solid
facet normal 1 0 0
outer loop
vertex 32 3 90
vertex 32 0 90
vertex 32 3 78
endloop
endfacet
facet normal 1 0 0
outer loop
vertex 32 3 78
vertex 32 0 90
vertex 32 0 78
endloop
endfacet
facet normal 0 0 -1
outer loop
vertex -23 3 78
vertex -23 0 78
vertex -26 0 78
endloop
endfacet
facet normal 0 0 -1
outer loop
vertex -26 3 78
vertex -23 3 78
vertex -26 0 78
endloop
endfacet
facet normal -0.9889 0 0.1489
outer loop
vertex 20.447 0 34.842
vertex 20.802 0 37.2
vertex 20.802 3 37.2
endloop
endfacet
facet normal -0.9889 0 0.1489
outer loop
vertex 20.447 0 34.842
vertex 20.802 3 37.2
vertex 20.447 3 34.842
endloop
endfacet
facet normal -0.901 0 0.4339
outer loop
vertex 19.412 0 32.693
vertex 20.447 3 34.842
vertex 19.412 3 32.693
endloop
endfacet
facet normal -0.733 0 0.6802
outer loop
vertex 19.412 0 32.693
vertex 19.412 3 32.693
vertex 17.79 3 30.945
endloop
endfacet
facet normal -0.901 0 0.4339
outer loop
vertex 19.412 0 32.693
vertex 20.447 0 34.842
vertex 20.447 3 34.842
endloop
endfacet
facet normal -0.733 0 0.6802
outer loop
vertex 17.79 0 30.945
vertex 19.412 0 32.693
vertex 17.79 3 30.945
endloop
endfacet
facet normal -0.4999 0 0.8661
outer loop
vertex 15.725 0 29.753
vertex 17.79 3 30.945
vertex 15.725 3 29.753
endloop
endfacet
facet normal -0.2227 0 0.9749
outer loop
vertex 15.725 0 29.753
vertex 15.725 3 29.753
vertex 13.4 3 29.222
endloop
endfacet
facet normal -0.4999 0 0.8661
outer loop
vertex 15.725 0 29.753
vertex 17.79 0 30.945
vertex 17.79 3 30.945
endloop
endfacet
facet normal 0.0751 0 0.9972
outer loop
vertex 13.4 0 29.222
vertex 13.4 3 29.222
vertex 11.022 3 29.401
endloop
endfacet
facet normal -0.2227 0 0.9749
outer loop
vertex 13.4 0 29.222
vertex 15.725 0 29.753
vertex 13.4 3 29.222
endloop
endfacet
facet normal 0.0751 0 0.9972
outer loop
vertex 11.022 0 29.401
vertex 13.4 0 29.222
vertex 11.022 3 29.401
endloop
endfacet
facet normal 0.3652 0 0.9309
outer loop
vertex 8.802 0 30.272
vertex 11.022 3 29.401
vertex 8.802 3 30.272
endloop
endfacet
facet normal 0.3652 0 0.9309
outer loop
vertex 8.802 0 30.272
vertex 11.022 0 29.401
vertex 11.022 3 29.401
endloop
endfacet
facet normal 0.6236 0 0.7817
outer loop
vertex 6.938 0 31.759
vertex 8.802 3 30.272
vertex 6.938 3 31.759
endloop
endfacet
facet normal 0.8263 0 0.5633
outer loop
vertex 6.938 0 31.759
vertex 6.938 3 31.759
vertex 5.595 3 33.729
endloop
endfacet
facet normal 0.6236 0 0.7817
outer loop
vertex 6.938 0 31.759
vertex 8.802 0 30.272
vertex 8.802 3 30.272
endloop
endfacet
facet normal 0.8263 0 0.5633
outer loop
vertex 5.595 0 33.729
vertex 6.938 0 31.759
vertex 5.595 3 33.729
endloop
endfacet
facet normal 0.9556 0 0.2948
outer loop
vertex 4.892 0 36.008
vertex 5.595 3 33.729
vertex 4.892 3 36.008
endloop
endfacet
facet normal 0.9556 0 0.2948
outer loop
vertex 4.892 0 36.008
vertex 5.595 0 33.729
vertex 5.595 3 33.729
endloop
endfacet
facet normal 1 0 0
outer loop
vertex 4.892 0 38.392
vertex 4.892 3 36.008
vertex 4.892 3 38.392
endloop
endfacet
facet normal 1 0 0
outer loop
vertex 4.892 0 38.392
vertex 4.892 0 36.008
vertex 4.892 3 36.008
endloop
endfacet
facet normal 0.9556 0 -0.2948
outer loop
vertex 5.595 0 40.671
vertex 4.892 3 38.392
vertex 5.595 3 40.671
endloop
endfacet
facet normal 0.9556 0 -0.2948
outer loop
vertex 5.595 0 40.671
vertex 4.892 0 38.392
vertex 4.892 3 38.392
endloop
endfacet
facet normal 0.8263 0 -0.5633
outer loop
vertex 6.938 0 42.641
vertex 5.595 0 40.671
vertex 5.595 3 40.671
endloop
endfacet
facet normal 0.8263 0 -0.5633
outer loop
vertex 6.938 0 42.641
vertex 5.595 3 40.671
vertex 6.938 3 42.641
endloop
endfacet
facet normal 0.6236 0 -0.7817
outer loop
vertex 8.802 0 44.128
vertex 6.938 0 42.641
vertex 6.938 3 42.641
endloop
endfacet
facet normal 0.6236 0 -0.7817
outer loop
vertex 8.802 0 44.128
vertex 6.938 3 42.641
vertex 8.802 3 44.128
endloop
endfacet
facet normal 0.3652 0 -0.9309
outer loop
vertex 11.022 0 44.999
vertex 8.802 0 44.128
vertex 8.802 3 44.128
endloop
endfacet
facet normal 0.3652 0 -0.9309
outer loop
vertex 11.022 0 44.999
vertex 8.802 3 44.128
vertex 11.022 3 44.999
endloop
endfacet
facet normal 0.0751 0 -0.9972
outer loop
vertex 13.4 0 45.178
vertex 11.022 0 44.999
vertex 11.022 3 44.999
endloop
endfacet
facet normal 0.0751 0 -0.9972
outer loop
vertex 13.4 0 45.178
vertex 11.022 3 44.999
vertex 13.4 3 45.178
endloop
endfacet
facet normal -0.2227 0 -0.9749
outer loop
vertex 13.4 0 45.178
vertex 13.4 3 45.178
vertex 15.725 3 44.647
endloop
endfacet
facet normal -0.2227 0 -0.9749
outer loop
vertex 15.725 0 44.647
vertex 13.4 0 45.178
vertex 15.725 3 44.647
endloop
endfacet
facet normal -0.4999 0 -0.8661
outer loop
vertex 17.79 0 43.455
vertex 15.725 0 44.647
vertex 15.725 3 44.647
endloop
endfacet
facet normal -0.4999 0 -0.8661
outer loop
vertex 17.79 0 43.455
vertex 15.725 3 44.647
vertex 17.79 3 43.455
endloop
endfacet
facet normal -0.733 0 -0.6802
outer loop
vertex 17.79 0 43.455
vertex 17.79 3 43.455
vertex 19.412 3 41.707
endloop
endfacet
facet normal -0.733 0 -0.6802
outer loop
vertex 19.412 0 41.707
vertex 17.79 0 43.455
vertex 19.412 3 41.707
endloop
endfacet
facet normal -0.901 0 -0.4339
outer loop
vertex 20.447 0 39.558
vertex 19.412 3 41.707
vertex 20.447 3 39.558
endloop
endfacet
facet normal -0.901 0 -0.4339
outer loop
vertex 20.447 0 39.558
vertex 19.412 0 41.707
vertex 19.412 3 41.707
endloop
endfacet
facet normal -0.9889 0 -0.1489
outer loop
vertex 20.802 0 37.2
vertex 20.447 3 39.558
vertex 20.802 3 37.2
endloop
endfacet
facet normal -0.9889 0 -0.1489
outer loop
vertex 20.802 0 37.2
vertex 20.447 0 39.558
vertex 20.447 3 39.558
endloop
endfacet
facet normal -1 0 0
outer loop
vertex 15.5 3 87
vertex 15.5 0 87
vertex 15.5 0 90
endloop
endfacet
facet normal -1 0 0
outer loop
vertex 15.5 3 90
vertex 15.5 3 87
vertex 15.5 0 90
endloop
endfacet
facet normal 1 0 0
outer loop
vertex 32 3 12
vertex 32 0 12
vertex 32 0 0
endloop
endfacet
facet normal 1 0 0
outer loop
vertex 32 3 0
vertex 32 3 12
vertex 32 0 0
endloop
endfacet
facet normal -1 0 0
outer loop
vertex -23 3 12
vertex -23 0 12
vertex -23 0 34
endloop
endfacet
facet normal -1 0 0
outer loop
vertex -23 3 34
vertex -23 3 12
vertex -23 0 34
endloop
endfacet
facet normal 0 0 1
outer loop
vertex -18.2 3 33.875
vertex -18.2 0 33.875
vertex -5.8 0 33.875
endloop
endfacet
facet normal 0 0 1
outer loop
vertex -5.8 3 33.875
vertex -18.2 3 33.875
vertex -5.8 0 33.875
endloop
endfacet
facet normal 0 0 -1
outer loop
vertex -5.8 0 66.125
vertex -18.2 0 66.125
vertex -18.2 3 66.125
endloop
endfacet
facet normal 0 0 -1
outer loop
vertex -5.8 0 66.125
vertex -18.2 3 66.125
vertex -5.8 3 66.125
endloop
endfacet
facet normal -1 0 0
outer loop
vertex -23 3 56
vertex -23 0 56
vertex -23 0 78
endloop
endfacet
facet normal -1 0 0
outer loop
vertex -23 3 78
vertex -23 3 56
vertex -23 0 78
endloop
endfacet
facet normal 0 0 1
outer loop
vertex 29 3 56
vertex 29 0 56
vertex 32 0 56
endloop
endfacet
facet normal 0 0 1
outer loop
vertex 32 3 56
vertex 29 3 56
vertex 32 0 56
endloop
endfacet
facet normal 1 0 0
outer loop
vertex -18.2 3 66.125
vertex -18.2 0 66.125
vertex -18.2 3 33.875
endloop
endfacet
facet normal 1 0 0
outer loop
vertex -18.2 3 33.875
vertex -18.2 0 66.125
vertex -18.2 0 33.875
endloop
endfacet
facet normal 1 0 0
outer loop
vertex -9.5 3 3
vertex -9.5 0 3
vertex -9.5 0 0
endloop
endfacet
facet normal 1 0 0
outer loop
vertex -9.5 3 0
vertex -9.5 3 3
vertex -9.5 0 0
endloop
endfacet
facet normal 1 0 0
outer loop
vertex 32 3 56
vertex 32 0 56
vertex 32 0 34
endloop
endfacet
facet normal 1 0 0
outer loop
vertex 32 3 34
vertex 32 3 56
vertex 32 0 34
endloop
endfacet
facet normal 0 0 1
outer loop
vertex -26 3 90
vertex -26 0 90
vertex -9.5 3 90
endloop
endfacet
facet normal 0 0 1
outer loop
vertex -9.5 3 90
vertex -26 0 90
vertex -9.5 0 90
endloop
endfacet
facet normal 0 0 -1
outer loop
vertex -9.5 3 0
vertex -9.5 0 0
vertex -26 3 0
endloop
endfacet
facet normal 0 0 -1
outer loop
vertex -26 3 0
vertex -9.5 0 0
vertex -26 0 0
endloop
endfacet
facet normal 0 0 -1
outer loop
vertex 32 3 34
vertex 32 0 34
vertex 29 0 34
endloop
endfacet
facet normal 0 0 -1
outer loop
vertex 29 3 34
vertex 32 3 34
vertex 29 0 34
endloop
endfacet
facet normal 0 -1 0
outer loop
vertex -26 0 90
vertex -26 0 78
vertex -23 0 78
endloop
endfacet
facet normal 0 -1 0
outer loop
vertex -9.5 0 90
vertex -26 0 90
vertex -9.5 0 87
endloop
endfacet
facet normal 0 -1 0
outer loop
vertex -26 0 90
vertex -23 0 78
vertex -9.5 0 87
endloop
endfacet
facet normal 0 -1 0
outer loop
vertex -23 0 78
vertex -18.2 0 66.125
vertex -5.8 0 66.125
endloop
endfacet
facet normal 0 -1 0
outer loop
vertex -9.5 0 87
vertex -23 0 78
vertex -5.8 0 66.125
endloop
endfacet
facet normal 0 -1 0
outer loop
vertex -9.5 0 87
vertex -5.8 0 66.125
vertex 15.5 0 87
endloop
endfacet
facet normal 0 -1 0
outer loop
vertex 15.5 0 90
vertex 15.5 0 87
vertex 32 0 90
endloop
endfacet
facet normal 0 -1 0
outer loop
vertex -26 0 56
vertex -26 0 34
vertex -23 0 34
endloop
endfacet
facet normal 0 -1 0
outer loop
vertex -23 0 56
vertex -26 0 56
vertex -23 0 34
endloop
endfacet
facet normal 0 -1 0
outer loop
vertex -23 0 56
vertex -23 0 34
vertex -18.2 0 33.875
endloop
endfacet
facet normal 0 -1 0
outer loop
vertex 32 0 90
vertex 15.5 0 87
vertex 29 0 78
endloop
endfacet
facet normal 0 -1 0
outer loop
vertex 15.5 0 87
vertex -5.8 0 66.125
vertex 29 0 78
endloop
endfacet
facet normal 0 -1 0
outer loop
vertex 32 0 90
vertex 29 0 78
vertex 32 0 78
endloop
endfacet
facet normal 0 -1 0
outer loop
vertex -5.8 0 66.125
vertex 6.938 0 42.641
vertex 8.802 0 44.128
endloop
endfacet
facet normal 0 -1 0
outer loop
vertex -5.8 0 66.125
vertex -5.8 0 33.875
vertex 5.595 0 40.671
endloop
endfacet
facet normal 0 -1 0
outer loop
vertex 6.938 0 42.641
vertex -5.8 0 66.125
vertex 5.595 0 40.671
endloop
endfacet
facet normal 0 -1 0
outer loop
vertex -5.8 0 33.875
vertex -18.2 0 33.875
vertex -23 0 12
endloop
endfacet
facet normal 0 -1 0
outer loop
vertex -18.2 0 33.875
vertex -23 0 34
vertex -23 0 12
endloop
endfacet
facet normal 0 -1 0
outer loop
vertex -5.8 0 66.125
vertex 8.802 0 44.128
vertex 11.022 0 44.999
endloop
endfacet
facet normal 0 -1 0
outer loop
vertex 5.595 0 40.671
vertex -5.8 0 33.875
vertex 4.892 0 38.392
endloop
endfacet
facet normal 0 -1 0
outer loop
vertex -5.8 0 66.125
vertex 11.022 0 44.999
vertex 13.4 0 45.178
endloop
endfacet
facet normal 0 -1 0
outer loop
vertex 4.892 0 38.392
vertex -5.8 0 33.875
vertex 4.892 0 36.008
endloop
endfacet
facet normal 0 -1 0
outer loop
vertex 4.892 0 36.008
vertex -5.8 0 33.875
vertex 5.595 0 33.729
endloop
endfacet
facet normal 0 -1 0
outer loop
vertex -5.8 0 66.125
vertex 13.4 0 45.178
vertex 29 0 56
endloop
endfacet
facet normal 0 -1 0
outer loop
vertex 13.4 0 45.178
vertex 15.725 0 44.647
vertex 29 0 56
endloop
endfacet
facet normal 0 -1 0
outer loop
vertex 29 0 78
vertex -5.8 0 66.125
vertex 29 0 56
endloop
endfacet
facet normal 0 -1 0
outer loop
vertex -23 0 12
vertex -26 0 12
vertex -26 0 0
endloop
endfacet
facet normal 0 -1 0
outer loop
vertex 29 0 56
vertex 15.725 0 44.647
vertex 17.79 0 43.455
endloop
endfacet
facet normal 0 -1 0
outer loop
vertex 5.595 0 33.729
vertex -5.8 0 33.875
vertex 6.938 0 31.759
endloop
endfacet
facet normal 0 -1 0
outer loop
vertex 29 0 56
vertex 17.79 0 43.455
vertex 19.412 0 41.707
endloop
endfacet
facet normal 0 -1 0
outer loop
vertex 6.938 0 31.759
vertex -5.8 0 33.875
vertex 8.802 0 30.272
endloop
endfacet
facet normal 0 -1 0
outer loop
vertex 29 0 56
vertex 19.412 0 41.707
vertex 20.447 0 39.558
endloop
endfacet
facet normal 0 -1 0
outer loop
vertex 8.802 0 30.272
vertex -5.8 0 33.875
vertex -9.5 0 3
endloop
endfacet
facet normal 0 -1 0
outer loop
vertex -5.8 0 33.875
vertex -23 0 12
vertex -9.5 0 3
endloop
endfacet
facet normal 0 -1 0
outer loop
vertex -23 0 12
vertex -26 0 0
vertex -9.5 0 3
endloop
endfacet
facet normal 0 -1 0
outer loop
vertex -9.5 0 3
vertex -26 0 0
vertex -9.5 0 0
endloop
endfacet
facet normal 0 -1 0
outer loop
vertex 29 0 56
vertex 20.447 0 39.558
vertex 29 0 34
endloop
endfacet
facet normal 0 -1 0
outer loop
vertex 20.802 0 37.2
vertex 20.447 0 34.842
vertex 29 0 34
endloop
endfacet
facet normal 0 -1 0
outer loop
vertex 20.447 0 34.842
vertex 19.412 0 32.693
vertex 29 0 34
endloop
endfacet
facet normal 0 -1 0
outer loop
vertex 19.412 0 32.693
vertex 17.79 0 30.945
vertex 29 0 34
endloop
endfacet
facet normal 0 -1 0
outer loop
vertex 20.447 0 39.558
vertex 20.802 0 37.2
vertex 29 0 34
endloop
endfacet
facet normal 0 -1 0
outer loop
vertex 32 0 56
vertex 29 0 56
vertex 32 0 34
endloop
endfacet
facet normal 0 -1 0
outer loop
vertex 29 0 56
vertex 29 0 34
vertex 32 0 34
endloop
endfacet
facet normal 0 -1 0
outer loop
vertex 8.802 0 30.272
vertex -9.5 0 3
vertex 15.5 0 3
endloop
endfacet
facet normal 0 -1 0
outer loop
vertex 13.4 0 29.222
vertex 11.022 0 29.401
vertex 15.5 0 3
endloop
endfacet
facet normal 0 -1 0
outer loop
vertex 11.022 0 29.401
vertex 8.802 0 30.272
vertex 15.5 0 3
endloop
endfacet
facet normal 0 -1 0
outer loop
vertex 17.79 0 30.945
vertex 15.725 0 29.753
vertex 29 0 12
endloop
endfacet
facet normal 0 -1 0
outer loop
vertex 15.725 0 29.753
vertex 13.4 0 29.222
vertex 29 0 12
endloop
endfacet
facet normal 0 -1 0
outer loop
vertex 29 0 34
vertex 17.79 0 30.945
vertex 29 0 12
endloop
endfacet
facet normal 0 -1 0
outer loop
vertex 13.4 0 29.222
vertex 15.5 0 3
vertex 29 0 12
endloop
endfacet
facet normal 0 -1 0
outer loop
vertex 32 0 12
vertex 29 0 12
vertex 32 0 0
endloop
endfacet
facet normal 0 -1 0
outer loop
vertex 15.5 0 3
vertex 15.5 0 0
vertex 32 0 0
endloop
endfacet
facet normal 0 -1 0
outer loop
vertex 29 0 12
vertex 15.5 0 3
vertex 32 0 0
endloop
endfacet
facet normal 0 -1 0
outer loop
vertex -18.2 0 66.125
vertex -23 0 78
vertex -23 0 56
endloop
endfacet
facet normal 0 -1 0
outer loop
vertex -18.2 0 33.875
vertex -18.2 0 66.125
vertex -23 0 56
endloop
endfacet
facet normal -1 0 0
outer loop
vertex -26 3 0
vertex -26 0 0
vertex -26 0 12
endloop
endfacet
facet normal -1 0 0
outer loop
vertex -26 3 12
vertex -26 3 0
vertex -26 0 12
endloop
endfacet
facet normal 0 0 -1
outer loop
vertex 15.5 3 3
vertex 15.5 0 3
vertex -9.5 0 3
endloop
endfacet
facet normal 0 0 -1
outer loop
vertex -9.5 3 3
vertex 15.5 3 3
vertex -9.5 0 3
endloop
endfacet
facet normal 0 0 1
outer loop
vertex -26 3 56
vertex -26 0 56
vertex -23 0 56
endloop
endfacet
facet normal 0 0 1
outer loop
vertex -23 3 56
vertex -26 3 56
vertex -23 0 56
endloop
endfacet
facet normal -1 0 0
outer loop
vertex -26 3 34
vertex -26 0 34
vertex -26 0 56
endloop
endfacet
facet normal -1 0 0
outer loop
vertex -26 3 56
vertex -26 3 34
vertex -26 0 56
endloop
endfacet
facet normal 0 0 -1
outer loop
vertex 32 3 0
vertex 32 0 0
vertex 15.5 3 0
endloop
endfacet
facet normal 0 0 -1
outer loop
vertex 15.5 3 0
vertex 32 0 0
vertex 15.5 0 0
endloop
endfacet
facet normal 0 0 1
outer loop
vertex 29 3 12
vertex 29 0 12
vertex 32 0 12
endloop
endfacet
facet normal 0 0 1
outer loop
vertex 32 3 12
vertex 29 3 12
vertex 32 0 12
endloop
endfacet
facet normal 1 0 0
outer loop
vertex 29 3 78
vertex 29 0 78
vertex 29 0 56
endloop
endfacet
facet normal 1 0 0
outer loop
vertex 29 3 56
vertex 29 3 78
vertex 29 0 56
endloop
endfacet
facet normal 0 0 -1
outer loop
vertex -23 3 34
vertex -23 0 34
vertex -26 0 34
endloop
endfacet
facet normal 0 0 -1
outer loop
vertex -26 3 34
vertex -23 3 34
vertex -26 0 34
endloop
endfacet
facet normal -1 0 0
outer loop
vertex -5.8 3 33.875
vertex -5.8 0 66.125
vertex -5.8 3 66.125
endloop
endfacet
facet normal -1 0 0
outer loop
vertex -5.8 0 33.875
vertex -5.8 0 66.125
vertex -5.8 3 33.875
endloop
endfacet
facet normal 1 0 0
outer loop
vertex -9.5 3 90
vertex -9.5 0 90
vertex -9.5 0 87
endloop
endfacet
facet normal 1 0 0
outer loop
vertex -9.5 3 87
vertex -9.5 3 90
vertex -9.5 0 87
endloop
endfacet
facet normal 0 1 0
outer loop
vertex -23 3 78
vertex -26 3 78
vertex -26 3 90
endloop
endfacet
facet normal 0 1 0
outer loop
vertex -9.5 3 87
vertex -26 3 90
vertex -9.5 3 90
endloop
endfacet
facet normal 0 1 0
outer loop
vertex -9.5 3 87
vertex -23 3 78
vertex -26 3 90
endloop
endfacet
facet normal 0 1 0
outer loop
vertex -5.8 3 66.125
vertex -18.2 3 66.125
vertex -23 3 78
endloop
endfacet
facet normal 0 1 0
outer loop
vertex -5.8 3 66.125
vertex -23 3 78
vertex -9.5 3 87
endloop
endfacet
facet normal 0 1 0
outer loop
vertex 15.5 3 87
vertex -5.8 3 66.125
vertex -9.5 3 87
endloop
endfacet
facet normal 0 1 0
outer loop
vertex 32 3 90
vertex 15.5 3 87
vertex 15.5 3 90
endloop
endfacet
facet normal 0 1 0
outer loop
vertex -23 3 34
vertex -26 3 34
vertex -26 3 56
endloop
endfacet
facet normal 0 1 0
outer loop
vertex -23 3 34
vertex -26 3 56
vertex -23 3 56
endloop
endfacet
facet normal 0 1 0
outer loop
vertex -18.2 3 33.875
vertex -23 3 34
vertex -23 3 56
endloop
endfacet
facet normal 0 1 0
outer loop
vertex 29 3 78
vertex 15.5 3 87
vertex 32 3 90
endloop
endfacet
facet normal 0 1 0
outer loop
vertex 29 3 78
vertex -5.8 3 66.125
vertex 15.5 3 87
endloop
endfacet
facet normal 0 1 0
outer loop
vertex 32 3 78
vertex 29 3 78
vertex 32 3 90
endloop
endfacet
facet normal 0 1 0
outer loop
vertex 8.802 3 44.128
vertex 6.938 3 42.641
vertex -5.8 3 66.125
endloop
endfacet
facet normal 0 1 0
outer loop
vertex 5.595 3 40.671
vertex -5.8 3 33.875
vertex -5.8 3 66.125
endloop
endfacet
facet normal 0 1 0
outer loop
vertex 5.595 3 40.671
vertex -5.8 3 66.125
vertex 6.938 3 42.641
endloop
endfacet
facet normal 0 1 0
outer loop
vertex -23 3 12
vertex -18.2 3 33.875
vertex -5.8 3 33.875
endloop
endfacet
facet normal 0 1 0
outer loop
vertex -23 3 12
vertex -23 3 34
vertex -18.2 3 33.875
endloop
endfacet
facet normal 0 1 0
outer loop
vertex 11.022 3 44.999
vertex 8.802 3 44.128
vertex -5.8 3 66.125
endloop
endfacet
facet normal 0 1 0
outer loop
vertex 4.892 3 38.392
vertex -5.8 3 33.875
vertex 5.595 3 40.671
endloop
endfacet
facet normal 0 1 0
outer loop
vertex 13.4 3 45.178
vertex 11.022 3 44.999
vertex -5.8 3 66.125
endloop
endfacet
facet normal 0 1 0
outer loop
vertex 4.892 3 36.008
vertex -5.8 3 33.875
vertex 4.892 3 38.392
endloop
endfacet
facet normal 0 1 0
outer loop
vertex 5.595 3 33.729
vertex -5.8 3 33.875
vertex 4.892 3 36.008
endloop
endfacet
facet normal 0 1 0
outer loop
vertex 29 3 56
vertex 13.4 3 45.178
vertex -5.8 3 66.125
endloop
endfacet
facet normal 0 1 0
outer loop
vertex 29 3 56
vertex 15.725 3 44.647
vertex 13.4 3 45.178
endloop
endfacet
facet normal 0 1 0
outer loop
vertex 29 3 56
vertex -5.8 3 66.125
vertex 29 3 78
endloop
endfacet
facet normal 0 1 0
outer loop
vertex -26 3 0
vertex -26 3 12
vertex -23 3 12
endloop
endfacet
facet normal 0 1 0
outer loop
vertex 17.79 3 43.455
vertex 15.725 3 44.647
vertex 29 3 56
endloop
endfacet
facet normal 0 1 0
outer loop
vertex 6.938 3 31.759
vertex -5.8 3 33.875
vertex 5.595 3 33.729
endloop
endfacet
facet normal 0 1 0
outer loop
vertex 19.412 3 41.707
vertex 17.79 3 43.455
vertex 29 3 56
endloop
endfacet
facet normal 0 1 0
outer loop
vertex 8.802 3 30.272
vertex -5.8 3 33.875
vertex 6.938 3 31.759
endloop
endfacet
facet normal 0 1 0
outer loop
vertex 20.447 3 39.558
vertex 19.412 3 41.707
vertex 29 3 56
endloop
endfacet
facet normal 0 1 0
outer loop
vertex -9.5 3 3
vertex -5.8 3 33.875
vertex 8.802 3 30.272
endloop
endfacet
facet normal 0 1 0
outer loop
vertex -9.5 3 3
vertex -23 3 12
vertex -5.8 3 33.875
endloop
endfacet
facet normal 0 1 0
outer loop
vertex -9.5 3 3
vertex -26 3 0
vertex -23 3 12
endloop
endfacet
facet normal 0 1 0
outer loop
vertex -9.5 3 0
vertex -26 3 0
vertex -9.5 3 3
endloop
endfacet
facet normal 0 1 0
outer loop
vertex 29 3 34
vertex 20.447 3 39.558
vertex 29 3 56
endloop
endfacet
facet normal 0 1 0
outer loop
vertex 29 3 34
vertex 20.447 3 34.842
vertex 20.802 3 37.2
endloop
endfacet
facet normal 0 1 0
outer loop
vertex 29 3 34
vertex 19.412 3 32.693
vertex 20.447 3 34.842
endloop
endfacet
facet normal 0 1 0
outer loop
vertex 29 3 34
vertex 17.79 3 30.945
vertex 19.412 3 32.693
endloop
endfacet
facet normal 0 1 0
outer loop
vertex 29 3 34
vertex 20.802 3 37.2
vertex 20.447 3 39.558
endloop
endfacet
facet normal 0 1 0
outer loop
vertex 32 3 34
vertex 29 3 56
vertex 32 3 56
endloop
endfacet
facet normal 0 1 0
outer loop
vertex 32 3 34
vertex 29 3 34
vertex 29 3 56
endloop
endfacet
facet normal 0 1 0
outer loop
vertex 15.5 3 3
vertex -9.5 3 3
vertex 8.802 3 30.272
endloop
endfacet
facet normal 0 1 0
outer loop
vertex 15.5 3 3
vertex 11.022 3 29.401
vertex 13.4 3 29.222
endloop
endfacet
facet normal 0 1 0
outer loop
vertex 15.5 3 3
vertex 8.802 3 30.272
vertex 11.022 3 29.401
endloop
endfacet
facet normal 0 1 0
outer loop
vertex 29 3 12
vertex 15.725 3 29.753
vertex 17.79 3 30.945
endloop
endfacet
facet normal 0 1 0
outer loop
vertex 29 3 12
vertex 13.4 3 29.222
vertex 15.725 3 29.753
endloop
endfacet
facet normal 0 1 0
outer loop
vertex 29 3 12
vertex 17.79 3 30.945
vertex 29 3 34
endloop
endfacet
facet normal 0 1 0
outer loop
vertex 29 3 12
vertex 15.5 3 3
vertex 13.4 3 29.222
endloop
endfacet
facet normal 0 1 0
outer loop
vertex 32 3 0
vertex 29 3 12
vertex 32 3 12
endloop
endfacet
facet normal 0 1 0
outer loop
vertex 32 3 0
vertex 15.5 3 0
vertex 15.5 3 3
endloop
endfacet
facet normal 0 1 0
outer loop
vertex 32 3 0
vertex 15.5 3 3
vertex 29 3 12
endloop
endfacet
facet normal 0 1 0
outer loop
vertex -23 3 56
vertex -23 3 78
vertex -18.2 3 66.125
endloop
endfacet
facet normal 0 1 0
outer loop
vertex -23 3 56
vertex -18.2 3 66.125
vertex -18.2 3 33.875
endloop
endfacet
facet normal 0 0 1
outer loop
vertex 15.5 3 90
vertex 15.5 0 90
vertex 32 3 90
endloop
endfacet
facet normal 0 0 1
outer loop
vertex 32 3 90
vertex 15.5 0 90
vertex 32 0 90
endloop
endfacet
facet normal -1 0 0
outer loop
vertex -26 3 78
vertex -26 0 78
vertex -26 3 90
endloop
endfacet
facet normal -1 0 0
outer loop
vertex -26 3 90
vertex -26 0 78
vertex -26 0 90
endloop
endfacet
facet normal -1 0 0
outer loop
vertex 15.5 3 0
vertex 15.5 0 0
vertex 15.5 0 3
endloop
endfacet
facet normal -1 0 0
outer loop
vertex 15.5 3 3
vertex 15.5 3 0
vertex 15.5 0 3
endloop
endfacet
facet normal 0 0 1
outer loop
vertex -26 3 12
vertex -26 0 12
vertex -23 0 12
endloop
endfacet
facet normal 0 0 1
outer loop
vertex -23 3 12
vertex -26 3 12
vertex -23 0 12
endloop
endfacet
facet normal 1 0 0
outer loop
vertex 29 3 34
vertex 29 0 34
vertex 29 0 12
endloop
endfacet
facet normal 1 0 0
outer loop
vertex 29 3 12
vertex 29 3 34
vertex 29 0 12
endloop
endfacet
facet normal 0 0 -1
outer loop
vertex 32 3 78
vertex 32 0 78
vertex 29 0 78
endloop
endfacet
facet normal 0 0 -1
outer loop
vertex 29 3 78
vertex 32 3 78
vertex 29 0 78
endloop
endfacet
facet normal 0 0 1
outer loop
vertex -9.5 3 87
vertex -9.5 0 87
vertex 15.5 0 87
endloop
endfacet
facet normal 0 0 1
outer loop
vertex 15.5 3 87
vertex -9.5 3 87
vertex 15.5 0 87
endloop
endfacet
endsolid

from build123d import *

# Parameters (mm, degrees)
SKETCH4_R           = 8
SKETCH4_W           = 12.4
SKETCH4_H           = 32.25
BOSS_EXTRUDE2_DEPTH = 3


with BuildPart() as part:
    # Sketch4 → Boss-Extrude2 (new body)
    with BuildSketch(Plane(origin=(0, 0, 0), x_dir=(1, 0, 0), z_dir=(0, 1, 0))):
        Polygon((-26, -90), (-9.5, -90), (-9.5, -87), (15.5, -87), (15.5, -90), (32, -90), (32, -78), (29, -78), (29, -56), (32, -56), (32, -34), (29, -34), (29, -12), (32, -12), (32, 0), (15.5, 0), (15.5, -3), (-9.5, -3), (-9.5, 0), (-26, 0), (-26, -12), (-23, -12), (-23, -34), (-26, -34), (-26, -56), (-23, -56), (-23, -78), (-26, -78), align=None)
        with Locations((12.802419237, -37.2)):
            Circle(SKETCH4_R, mode=Mode.SUBTRACT)
        with Locations((-12, -50)):
            Rectangle(SKETCH4_W, SKETCH4_H, mode=Mode.SUBTRACT)
    extrude(amount=BOSS_EXTRUDE2_DEPTH)


solid = part.part
